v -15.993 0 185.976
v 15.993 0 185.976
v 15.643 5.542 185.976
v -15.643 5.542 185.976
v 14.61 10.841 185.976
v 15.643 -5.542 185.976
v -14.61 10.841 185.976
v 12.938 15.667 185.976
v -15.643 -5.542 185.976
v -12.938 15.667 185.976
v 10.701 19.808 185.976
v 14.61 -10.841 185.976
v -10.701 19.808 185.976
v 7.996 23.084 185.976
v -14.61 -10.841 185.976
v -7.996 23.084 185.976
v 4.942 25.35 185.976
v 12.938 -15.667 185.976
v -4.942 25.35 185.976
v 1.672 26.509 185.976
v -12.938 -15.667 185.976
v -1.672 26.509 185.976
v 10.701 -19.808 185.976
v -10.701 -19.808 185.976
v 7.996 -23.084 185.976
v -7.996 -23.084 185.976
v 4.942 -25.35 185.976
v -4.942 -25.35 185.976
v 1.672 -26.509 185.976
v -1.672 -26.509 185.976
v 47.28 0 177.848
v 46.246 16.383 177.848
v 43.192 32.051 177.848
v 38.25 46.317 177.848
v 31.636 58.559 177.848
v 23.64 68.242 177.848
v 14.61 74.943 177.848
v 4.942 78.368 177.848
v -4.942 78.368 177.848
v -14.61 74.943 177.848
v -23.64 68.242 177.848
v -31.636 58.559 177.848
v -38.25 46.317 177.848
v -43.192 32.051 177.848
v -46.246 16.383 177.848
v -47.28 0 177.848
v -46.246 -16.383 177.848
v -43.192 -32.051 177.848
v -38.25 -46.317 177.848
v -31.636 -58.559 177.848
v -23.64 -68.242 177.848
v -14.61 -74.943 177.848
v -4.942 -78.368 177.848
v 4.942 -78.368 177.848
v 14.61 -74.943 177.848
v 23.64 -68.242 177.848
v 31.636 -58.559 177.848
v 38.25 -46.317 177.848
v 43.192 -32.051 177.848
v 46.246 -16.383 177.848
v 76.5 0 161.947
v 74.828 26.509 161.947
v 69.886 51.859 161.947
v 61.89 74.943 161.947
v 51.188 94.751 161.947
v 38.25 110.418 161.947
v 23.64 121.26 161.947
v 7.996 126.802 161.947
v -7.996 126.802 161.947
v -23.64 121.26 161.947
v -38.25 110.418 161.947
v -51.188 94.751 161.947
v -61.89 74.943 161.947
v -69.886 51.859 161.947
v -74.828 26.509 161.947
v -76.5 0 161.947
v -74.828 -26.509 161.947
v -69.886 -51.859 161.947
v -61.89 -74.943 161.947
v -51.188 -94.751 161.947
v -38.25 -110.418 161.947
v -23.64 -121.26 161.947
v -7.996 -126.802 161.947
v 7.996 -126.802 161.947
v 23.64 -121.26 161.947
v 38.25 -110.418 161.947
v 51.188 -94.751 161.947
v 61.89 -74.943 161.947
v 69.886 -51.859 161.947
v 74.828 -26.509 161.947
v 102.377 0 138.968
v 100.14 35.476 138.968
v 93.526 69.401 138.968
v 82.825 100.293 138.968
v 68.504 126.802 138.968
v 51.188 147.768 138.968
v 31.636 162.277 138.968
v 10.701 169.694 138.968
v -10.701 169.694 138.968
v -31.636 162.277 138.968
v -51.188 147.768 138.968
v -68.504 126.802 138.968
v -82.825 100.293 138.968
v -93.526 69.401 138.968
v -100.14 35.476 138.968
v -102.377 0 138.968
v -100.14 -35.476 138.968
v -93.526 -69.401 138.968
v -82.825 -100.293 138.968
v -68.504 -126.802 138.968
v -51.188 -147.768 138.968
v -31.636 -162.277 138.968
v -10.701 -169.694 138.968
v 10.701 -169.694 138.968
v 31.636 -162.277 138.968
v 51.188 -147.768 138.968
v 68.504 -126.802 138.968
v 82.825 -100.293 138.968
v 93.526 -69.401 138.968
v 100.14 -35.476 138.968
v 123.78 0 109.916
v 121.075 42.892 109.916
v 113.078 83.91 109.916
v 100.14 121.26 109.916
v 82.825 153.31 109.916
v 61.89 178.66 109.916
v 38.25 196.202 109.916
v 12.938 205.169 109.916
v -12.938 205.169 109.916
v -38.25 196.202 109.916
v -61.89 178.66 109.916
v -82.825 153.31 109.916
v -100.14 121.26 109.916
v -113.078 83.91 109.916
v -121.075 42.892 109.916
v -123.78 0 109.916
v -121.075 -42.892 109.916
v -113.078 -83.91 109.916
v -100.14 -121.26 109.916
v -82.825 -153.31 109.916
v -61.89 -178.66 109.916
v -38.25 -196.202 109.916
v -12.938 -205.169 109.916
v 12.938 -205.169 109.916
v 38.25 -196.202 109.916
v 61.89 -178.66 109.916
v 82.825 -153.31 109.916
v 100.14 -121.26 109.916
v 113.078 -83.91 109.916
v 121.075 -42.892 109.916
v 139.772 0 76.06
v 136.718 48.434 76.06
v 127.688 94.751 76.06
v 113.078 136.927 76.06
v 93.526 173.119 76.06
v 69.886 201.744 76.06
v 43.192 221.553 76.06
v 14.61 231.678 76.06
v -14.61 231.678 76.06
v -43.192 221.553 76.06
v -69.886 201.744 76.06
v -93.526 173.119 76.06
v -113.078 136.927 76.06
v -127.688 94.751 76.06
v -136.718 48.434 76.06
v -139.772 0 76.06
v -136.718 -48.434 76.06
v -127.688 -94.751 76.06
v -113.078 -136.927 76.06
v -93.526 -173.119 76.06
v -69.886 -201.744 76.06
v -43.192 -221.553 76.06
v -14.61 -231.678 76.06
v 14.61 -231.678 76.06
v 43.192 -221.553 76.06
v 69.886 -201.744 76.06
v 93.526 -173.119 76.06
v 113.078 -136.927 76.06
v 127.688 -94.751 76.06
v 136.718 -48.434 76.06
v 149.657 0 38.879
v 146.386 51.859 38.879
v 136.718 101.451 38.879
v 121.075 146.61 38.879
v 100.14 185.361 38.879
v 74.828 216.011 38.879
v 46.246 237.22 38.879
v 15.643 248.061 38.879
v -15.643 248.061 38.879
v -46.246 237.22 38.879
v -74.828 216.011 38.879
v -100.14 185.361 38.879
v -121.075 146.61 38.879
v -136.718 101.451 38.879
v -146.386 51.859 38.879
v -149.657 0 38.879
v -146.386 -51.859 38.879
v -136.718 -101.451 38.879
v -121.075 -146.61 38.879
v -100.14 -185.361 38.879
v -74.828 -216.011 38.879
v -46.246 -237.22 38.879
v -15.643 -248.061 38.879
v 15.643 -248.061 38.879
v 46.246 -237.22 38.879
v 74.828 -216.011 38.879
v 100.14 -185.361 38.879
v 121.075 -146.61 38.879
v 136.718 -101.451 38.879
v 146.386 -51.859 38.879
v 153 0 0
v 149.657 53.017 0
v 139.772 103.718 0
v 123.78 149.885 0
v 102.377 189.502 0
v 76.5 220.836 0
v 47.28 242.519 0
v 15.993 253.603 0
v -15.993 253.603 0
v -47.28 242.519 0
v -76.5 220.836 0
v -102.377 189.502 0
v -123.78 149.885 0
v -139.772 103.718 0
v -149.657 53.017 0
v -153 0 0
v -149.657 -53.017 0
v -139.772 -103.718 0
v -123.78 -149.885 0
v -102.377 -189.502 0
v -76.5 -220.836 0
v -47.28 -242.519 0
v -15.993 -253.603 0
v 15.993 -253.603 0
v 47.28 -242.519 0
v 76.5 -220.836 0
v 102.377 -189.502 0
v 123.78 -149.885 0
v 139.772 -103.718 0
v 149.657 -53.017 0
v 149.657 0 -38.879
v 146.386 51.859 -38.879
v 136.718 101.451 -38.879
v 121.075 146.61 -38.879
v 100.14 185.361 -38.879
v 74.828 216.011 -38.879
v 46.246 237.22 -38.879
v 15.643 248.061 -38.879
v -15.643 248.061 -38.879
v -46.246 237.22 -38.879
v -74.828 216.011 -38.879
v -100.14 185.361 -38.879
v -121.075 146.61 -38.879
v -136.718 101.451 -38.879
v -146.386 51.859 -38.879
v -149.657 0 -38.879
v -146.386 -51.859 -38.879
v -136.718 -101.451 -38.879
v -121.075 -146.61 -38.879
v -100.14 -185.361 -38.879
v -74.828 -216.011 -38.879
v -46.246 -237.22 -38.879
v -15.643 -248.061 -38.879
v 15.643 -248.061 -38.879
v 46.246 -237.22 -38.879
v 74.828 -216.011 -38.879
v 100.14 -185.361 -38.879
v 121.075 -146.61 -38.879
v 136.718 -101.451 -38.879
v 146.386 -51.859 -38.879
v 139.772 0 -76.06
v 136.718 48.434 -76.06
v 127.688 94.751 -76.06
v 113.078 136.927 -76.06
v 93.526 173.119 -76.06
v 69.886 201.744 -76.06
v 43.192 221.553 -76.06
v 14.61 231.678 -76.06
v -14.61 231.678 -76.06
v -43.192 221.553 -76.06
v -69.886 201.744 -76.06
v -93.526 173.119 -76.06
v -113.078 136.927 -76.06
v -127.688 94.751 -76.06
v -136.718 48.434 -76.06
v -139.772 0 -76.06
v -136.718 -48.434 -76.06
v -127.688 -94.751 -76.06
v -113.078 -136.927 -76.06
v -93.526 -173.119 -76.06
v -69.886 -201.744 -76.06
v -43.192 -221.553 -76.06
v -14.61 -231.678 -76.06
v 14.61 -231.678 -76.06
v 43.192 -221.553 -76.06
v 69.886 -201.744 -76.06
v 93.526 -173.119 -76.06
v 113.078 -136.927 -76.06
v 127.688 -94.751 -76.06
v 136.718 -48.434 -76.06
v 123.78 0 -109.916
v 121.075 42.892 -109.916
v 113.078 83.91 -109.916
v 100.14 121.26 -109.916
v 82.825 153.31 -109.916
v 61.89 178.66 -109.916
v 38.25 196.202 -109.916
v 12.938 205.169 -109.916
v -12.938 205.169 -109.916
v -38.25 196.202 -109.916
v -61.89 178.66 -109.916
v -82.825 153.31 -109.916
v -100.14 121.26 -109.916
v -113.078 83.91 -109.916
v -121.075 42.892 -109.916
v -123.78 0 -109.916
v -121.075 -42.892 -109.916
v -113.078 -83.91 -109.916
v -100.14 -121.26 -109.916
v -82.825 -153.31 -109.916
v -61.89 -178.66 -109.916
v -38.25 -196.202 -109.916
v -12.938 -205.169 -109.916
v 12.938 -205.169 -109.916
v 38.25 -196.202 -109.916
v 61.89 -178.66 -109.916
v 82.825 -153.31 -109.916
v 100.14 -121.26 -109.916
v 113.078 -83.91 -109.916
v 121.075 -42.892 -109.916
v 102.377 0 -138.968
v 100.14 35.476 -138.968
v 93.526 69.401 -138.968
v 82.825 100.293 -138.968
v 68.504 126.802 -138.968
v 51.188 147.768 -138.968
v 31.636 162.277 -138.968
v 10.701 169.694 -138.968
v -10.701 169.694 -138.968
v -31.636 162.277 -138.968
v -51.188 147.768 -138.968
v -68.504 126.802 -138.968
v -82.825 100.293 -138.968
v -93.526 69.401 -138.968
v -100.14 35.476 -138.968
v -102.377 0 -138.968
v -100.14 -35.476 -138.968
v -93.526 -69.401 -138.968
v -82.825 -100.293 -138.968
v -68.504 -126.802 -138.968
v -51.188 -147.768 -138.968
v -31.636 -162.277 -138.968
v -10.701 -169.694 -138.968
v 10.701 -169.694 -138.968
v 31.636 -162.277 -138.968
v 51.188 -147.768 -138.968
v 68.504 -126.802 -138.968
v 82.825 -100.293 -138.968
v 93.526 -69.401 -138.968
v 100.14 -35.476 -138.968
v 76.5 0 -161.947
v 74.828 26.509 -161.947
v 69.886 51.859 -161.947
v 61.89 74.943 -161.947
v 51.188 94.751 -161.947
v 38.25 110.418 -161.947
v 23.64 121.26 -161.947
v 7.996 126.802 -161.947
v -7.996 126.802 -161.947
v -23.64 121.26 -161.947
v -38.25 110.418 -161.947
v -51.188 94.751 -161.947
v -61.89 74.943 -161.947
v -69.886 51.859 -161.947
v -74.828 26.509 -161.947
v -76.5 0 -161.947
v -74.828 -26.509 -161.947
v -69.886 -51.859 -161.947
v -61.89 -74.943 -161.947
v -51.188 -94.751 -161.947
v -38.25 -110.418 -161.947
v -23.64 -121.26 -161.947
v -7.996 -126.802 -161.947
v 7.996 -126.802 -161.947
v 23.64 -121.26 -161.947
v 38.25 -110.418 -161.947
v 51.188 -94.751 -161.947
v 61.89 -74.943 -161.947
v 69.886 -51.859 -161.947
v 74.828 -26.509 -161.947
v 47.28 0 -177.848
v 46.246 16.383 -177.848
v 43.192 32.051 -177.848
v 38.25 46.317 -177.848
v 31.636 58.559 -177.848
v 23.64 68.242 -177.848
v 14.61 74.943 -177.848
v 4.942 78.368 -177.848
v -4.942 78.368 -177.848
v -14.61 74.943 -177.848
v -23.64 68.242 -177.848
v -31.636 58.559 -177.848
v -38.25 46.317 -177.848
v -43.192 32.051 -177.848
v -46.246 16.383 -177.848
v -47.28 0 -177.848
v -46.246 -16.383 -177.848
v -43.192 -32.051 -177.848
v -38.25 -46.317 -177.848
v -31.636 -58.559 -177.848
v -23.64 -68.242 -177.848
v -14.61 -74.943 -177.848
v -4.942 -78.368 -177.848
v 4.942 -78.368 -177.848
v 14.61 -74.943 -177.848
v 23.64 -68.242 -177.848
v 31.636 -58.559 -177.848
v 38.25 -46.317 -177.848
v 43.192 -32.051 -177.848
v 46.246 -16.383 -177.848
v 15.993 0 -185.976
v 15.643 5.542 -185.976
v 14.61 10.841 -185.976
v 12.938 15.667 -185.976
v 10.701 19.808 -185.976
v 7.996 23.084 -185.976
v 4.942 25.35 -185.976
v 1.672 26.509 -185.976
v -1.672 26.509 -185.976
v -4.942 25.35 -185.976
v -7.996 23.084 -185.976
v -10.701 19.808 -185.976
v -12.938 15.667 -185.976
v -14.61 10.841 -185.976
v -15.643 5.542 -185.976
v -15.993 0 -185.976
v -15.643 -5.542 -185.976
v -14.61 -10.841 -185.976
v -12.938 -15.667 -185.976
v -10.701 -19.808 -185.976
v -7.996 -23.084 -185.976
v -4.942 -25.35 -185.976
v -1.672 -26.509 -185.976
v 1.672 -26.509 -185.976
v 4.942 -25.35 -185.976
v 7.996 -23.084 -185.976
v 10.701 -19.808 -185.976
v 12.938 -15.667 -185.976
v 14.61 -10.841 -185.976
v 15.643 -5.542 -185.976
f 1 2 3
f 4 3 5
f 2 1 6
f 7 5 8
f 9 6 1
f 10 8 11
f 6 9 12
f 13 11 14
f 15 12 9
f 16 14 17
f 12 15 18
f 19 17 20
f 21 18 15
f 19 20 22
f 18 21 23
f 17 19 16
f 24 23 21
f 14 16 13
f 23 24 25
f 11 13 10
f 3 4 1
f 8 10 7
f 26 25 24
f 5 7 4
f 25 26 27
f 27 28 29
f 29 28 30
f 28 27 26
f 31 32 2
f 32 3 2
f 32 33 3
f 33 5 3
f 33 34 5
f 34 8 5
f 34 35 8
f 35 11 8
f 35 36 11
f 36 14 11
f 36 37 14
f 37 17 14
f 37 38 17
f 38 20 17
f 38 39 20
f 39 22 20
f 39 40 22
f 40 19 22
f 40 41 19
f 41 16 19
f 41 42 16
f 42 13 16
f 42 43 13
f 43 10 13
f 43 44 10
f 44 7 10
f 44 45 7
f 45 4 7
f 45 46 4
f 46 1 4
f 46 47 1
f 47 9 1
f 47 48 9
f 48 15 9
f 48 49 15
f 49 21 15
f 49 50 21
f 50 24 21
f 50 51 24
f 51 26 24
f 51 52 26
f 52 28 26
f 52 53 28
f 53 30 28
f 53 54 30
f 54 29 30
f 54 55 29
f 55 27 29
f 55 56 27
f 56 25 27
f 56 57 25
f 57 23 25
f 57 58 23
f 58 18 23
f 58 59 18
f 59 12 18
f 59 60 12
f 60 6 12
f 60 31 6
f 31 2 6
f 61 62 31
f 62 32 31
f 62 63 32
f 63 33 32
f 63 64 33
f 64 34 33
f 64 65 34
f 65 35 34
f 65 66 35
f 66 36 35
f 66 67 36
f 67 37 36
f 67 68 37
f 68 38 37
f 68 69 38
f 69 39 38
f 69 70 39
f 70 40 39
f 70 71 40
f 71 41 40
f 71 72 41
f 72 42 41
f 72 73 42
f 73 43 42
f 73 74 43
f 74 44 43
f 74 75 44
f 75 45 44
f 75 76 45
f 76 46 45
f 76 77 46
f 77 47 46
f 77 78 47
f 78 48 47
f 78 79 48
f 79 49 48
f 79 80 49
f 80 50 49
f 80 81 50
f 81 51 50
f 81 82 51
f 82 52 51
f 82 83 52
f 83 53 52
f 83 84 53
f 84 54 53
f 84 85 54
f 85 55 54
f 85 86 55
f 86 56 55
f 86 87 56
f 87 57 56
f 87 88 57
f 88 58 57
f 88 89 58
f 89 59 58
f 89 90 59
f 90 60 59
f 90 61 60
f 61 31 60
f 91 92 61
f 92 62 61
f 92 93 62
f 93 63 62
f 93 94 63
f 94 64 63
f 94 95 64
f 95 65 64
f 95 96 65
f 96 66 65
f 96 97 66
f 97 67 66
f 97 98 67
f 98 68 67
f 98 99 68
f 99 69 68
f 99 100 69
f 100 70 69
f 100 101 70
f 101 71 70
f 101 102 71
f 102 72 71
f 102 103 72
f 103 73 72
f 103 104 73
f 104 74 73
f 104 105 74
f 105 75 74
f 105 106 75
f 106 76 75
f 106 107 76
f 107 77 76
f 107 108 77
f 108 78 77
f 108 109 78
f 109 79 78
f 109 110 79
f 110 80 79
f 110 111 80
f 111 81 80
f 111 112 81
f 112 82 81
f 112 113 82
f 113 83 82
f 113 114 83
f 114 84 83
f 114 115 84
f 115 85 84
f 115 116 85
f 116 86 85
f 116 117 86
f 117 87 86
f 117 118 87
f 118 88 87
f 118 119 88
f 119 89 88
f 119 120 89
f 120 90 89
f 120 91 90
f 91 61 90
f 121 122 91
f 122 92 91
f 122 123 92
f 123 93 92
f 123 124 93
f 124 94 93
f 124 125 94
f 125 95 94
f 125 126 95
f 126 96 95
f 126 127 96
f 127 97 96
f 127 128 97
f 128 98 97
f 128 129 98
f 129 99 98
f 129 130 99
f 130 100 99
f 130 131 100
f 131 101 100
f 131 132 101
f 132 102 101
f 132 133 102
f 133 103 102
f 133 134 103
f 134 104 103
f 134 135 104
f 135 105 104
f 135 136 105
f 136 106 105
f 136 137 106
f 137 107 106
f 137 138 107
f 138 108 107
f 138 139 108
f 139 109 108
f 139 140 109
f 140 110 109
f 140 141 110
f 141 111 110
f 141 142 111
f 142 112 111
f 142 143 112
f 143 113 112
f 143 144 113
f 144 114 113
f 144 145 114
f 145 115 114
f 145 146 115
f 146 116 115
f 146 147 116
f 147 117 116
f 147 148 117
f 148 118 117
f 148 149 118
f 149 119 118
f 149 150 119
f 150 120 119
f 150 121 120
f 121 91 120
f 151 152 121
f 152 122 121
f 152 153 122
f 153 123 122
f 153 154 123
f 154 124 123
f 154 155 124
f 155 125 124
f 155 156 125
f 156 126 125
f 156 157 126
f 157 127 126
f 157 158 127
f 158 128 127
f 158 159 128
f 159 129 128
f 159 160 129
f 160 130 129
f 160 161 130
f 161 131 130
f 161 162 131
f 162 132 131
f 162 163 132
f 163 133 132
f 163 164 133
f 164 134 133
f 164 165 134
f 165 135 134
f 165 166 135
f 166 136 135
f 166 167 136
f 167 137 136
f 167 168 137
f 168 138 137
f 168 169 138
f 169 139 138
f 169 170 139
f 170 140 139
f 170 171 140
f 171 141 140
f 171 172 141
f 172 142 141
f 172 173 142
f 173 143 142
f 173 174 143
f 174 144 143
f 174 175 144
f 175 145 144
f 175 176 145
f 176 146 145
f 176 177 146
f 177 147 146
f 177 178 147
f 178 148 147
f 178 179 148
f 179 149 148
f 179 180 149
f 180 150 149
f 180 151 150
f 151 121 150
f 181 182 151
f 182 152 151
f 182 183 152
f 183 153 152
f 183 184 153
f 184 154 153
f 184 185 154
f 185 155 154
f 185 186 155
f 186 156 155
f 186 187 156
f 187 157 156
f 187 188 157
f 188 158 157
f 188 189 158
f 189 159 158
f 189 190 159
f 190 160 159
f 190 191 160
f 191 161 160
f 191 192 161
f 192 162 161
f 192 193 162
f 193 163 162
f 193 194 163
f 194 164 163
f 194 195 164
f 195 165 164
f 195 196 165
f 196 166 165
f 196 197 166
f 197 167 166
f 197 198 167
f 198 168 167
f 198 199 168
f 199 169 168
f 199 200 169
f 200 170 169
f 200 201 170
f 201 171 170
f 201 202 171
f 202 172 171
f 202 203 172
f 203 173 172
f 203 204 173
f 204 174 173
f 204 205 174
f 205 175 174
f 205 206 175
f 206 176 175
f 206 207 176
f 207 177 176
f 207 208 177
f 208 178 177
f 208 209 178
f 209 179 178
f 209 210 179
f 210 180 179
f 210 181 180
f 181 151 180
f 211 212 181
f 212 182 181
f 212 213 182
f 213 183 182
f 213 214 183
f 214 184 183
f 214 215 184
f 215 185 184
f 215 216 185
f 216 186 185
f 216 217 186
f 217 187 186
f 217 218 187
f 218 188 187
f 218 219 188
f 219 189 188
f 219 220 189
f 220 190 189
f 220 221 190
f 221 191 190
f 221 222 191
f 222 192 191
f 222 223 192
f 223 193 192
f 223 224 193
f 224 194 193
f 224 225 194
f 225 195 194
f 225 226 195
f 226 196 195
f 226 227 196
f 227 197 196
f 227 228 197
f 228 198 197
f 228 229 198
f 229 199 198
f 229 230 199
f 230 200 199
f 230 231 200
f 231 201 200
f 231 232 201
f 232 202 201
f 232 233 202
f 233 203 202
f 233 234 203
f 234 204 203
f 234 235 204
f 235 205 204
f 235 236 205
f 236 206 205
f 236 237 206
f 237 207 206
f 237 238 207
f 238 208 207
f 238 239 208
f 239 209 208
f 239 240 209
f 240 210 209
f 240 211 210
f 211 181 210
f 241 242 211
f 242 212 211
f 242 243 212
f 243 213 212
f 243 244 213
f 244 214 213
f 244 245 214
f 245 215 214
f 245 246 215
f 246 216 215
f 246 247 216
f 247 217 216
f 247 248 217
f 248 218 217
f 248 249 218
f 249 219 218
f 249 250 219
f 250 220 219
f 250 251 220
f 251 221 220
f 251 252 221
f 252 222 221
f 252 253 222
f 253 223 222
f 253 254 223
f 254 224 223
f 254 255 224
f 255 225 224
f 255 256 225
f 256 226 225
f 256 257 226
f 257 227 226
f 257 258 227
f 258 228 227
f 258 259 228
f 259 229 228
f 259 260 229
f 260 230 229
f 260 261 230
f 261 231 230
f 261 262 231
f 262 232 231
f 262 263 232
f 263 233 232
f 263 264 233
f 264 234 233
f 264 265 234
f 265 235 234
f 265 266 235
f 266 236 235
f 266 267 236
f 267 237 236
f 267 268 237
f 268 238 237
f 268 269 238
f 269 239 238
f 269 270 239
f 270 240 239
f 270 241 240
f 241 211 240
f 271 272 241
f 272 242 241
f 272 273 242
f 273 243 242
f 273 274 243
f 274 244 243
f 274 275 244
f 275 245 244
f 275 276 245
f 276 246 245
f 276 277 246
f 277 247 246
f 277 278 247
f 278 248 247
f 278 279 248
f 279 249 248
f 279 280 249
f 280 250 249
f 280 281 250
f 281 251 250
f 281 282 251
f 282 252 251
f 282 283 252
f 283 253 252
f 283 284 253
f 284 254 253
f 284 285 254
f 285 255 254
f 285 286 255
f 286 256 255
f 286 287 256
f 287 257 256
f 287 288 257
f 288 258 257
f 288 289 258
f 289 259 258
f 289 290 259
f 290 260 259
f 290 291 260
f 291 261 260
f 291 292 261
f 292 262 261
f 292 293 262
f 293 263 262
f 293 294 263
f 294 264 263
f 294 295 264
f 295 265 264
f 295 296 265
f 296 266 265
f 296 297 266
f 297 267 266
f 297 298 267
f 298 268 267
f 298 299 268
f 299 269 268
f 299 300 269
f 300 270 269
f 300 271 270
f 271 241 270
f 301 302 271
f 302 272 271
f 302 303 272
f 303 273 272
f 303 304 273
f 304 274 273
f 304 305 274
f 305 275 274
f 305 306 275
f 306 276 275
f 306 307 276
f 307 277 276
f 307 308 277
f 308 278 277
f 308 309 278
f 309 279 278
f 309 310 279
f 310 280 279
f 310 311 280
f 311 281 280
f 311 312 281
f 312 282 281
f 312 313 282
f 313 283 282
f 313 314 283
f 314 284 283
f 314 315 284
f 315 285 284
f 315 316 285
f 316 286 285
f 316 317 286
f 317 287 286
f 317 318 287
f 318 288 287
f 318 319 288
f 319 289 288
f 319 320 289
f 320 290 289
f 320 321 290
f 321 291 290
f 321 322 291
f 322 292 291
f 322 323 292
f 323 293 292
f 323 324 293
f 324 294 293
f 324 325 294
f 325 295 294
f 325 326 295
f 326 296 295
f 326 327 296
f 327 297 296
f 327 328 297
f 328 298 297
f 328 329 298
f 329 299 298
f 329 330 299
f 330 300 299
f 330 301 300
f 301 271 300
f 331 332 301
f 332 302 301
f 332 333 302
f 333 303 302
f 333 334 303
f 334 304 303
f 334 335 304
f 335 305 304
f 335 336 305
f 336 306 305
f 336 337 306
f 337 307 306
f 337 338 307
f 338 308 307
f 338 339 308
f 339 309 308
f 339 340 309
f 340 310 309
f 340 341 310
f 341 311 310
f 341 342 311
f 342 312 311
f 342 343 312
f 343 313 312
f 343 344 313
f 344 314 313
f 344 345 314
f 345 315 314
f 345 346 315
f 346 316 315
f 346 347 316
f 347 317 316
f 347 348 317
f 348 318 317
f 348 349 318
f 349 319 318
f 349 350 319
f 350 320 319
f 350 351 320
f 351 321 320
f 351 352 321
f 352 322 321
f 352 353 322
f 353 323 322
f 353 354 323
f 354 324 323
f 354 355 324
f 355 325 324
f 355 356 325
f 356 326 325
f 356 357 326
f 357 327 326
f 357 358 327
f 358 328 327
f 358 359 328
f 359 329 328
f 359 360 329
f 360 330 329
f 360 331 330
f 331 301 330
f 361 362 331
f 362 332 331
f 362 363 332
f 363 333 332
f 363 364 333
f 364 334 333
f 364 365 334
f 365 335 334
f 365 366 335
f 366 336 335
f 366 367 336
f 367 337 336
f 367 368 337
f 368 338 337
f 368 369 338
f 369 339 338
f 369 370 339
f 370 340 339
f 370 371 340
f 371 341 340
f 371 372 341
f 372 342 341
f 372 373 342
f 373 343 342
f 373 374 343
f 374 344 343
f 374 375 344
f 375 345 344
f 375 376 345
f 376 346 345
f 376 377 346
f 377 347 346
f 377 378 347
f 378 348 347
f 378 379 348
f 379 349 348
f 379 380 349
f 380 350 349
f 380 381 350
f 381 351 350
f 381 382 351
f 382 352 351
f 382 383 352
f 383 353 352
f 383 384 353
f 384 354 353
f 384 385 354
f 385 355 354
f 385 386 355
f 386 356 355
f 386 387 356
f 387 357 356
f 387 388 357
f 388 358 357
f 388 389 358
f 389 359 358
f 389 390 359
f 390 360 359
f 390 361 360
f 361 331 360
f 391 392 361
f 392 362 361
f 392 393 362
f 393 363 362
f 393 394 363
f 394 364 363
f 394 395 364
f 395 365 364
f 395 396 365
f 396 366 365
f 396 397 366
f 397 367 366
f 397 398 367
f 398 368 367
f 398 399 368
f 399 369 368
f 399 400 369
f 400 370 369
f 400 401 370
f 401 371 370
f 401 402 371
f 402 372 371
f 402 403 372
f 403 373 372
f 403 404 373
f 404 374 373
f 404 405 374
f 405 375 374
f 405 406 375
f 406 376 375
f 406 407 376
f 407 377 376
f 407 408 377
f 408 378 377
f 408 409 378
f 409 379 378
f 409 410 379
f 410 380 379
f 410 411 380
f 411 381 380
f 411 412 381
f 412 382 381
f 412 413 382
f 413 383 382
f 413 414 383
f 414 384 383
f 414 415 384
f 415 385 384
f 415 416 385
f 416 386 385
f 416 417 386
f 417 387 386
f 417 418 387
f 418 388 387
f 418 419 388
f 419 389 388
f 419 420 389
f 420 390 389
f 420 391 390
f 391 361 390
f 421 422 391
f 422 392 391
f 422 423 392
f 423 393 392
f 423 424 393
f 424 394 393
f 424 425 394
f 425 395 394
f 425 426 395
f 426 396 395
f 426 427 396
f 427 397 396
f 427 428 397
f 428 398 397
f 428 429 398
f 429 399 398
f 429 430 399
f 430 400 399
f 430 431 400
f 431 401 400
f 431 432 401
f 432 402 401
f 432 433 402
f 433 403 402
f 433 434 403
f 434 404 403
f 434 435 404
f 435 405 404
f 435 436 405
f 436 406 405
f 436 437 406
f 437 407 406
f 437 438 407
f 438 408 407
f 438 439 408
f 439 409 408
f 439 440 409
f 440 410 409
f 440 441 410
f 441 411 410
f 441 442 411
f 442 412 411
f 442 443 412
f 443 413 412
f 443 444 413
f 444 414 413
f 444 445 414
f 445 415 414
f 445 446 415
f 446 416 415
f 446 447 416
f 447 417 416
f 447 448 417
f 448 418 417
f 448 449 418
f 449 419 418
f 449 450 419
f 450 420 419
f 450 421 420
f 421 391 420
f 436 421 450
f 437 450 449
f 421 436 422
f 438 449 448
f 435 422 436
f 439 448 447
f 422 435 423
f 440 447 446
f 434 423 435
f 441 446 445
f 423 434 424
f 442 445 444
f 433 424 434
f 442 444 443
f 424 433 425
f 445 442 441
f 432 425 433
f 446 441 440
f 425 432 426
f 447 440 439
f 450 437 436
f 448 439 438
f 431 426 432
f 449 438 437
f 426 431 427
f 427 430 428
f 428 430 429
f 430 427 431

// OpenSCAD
// Generated by SolidPython 1.0.1 on 2020-07-29 00:46:49


scale(v = [9, 15, 11]) {
	sphere(r = 17);
}
/***********************************************
*********      SolidPython code:      **********
************************************************
 
# import packages: SolidPython
from solid import *
from solid.utils import *
from itertools import chain, combinations, permutations


class Resize:

    def __init__(self, scad_file):
        self.scad_file = scad_file
        #self.scad_file = import_scad(scad_file)
        # cone/cylinder param:
        self.r1 = 0
        self.r2 = 0
        self.h = 0
        # rectangular prism param:
        self.w = 0
        self.l = 0
        # ellipse param:
        self.r = 0

    # import OpenScad code (file name corresponds to shape)


    # classify shape + parameters
    def assign(self, param1, param2, param3):
        if self.scad_file == 'cone.scad':
            self.r1 = param1
            self.r2 = param2
            self.h = param3
        elif self.scad_file == 'cylinder.scad':
            self.r1 = param1
            self.r2 = param2
            self.h = param3
        elif self.scad_file == 'rectangularPrism.scad':
            self.h = param1
            self.l = param2
            self.w = param3
        else:
            self.r = param1
            self.h = param2

    # resize parameters
    def iterate(self):
        x = range(3, 20, 2)
        i = 1
        if self.scad_file == 'cone.scad':
            tempList = list(permutations(x, 2))
            for temp in tempList:
                param1 = temp[0]
                param2 = temp[1]
                filepath = 'produced_scad_files/' + 'cone' + str(param1) + '_' + str(param2) + '_' + '.scad'
                scad_render_to_file(cylinder(h=param1, r1=param2, r2=0), filepath)

        elif self.scad_file == 'cylinder.scad':
            tempList = list(permutations(x, 3))
            for temp in tempList:
                param1 = temp[0]
                param2 = temp[1]
                filepath = 'produced_scad_files/' + 'cylinder' + str(param1) + '_' + str(param2) + '_' + '.scad'
                scad_render_to_file(cylinder(h=param1, r1=param2, r2=param2), filepath)

        elif self.scad_file == 'rectangularPrism.scad':
            tempList = list(permutations(x, 3))
            for temp in tempList:
                param1 = temp[0]
                param2 = temp[1]
                param3 = temp[2]
                filepath = 'produced_scad_files/' + 'rectangularPrism' + str(param1) + '_' + str(param2) + '_' + str(
                    param3) + '.scad'
                scad_render_to_file(cube(size=(param1, param2, param3)), filepath)

        elif self.scad_file == 'ellipse.scad':
            tempList = list(permutations(x, 4))
            for temp in tempList:
                param1 = temp[0]
                param2 = temp[1]
                param3 = temp[2]
                param4 = temp[3]
                filepath = 'produced_scad_files/' + 'ellipse' + str(param1) + '_' + str(param2) + '_' + str(param3) + '_' + str(param4) + '.scad'
                scad_render_to_file(scale([param1, param2, param3])(sphere(r=param4)), filepath)

    def render_to_scadfile(self):
        scad_render_to_file(scad, 'example.scad') 
 
************************************************/
